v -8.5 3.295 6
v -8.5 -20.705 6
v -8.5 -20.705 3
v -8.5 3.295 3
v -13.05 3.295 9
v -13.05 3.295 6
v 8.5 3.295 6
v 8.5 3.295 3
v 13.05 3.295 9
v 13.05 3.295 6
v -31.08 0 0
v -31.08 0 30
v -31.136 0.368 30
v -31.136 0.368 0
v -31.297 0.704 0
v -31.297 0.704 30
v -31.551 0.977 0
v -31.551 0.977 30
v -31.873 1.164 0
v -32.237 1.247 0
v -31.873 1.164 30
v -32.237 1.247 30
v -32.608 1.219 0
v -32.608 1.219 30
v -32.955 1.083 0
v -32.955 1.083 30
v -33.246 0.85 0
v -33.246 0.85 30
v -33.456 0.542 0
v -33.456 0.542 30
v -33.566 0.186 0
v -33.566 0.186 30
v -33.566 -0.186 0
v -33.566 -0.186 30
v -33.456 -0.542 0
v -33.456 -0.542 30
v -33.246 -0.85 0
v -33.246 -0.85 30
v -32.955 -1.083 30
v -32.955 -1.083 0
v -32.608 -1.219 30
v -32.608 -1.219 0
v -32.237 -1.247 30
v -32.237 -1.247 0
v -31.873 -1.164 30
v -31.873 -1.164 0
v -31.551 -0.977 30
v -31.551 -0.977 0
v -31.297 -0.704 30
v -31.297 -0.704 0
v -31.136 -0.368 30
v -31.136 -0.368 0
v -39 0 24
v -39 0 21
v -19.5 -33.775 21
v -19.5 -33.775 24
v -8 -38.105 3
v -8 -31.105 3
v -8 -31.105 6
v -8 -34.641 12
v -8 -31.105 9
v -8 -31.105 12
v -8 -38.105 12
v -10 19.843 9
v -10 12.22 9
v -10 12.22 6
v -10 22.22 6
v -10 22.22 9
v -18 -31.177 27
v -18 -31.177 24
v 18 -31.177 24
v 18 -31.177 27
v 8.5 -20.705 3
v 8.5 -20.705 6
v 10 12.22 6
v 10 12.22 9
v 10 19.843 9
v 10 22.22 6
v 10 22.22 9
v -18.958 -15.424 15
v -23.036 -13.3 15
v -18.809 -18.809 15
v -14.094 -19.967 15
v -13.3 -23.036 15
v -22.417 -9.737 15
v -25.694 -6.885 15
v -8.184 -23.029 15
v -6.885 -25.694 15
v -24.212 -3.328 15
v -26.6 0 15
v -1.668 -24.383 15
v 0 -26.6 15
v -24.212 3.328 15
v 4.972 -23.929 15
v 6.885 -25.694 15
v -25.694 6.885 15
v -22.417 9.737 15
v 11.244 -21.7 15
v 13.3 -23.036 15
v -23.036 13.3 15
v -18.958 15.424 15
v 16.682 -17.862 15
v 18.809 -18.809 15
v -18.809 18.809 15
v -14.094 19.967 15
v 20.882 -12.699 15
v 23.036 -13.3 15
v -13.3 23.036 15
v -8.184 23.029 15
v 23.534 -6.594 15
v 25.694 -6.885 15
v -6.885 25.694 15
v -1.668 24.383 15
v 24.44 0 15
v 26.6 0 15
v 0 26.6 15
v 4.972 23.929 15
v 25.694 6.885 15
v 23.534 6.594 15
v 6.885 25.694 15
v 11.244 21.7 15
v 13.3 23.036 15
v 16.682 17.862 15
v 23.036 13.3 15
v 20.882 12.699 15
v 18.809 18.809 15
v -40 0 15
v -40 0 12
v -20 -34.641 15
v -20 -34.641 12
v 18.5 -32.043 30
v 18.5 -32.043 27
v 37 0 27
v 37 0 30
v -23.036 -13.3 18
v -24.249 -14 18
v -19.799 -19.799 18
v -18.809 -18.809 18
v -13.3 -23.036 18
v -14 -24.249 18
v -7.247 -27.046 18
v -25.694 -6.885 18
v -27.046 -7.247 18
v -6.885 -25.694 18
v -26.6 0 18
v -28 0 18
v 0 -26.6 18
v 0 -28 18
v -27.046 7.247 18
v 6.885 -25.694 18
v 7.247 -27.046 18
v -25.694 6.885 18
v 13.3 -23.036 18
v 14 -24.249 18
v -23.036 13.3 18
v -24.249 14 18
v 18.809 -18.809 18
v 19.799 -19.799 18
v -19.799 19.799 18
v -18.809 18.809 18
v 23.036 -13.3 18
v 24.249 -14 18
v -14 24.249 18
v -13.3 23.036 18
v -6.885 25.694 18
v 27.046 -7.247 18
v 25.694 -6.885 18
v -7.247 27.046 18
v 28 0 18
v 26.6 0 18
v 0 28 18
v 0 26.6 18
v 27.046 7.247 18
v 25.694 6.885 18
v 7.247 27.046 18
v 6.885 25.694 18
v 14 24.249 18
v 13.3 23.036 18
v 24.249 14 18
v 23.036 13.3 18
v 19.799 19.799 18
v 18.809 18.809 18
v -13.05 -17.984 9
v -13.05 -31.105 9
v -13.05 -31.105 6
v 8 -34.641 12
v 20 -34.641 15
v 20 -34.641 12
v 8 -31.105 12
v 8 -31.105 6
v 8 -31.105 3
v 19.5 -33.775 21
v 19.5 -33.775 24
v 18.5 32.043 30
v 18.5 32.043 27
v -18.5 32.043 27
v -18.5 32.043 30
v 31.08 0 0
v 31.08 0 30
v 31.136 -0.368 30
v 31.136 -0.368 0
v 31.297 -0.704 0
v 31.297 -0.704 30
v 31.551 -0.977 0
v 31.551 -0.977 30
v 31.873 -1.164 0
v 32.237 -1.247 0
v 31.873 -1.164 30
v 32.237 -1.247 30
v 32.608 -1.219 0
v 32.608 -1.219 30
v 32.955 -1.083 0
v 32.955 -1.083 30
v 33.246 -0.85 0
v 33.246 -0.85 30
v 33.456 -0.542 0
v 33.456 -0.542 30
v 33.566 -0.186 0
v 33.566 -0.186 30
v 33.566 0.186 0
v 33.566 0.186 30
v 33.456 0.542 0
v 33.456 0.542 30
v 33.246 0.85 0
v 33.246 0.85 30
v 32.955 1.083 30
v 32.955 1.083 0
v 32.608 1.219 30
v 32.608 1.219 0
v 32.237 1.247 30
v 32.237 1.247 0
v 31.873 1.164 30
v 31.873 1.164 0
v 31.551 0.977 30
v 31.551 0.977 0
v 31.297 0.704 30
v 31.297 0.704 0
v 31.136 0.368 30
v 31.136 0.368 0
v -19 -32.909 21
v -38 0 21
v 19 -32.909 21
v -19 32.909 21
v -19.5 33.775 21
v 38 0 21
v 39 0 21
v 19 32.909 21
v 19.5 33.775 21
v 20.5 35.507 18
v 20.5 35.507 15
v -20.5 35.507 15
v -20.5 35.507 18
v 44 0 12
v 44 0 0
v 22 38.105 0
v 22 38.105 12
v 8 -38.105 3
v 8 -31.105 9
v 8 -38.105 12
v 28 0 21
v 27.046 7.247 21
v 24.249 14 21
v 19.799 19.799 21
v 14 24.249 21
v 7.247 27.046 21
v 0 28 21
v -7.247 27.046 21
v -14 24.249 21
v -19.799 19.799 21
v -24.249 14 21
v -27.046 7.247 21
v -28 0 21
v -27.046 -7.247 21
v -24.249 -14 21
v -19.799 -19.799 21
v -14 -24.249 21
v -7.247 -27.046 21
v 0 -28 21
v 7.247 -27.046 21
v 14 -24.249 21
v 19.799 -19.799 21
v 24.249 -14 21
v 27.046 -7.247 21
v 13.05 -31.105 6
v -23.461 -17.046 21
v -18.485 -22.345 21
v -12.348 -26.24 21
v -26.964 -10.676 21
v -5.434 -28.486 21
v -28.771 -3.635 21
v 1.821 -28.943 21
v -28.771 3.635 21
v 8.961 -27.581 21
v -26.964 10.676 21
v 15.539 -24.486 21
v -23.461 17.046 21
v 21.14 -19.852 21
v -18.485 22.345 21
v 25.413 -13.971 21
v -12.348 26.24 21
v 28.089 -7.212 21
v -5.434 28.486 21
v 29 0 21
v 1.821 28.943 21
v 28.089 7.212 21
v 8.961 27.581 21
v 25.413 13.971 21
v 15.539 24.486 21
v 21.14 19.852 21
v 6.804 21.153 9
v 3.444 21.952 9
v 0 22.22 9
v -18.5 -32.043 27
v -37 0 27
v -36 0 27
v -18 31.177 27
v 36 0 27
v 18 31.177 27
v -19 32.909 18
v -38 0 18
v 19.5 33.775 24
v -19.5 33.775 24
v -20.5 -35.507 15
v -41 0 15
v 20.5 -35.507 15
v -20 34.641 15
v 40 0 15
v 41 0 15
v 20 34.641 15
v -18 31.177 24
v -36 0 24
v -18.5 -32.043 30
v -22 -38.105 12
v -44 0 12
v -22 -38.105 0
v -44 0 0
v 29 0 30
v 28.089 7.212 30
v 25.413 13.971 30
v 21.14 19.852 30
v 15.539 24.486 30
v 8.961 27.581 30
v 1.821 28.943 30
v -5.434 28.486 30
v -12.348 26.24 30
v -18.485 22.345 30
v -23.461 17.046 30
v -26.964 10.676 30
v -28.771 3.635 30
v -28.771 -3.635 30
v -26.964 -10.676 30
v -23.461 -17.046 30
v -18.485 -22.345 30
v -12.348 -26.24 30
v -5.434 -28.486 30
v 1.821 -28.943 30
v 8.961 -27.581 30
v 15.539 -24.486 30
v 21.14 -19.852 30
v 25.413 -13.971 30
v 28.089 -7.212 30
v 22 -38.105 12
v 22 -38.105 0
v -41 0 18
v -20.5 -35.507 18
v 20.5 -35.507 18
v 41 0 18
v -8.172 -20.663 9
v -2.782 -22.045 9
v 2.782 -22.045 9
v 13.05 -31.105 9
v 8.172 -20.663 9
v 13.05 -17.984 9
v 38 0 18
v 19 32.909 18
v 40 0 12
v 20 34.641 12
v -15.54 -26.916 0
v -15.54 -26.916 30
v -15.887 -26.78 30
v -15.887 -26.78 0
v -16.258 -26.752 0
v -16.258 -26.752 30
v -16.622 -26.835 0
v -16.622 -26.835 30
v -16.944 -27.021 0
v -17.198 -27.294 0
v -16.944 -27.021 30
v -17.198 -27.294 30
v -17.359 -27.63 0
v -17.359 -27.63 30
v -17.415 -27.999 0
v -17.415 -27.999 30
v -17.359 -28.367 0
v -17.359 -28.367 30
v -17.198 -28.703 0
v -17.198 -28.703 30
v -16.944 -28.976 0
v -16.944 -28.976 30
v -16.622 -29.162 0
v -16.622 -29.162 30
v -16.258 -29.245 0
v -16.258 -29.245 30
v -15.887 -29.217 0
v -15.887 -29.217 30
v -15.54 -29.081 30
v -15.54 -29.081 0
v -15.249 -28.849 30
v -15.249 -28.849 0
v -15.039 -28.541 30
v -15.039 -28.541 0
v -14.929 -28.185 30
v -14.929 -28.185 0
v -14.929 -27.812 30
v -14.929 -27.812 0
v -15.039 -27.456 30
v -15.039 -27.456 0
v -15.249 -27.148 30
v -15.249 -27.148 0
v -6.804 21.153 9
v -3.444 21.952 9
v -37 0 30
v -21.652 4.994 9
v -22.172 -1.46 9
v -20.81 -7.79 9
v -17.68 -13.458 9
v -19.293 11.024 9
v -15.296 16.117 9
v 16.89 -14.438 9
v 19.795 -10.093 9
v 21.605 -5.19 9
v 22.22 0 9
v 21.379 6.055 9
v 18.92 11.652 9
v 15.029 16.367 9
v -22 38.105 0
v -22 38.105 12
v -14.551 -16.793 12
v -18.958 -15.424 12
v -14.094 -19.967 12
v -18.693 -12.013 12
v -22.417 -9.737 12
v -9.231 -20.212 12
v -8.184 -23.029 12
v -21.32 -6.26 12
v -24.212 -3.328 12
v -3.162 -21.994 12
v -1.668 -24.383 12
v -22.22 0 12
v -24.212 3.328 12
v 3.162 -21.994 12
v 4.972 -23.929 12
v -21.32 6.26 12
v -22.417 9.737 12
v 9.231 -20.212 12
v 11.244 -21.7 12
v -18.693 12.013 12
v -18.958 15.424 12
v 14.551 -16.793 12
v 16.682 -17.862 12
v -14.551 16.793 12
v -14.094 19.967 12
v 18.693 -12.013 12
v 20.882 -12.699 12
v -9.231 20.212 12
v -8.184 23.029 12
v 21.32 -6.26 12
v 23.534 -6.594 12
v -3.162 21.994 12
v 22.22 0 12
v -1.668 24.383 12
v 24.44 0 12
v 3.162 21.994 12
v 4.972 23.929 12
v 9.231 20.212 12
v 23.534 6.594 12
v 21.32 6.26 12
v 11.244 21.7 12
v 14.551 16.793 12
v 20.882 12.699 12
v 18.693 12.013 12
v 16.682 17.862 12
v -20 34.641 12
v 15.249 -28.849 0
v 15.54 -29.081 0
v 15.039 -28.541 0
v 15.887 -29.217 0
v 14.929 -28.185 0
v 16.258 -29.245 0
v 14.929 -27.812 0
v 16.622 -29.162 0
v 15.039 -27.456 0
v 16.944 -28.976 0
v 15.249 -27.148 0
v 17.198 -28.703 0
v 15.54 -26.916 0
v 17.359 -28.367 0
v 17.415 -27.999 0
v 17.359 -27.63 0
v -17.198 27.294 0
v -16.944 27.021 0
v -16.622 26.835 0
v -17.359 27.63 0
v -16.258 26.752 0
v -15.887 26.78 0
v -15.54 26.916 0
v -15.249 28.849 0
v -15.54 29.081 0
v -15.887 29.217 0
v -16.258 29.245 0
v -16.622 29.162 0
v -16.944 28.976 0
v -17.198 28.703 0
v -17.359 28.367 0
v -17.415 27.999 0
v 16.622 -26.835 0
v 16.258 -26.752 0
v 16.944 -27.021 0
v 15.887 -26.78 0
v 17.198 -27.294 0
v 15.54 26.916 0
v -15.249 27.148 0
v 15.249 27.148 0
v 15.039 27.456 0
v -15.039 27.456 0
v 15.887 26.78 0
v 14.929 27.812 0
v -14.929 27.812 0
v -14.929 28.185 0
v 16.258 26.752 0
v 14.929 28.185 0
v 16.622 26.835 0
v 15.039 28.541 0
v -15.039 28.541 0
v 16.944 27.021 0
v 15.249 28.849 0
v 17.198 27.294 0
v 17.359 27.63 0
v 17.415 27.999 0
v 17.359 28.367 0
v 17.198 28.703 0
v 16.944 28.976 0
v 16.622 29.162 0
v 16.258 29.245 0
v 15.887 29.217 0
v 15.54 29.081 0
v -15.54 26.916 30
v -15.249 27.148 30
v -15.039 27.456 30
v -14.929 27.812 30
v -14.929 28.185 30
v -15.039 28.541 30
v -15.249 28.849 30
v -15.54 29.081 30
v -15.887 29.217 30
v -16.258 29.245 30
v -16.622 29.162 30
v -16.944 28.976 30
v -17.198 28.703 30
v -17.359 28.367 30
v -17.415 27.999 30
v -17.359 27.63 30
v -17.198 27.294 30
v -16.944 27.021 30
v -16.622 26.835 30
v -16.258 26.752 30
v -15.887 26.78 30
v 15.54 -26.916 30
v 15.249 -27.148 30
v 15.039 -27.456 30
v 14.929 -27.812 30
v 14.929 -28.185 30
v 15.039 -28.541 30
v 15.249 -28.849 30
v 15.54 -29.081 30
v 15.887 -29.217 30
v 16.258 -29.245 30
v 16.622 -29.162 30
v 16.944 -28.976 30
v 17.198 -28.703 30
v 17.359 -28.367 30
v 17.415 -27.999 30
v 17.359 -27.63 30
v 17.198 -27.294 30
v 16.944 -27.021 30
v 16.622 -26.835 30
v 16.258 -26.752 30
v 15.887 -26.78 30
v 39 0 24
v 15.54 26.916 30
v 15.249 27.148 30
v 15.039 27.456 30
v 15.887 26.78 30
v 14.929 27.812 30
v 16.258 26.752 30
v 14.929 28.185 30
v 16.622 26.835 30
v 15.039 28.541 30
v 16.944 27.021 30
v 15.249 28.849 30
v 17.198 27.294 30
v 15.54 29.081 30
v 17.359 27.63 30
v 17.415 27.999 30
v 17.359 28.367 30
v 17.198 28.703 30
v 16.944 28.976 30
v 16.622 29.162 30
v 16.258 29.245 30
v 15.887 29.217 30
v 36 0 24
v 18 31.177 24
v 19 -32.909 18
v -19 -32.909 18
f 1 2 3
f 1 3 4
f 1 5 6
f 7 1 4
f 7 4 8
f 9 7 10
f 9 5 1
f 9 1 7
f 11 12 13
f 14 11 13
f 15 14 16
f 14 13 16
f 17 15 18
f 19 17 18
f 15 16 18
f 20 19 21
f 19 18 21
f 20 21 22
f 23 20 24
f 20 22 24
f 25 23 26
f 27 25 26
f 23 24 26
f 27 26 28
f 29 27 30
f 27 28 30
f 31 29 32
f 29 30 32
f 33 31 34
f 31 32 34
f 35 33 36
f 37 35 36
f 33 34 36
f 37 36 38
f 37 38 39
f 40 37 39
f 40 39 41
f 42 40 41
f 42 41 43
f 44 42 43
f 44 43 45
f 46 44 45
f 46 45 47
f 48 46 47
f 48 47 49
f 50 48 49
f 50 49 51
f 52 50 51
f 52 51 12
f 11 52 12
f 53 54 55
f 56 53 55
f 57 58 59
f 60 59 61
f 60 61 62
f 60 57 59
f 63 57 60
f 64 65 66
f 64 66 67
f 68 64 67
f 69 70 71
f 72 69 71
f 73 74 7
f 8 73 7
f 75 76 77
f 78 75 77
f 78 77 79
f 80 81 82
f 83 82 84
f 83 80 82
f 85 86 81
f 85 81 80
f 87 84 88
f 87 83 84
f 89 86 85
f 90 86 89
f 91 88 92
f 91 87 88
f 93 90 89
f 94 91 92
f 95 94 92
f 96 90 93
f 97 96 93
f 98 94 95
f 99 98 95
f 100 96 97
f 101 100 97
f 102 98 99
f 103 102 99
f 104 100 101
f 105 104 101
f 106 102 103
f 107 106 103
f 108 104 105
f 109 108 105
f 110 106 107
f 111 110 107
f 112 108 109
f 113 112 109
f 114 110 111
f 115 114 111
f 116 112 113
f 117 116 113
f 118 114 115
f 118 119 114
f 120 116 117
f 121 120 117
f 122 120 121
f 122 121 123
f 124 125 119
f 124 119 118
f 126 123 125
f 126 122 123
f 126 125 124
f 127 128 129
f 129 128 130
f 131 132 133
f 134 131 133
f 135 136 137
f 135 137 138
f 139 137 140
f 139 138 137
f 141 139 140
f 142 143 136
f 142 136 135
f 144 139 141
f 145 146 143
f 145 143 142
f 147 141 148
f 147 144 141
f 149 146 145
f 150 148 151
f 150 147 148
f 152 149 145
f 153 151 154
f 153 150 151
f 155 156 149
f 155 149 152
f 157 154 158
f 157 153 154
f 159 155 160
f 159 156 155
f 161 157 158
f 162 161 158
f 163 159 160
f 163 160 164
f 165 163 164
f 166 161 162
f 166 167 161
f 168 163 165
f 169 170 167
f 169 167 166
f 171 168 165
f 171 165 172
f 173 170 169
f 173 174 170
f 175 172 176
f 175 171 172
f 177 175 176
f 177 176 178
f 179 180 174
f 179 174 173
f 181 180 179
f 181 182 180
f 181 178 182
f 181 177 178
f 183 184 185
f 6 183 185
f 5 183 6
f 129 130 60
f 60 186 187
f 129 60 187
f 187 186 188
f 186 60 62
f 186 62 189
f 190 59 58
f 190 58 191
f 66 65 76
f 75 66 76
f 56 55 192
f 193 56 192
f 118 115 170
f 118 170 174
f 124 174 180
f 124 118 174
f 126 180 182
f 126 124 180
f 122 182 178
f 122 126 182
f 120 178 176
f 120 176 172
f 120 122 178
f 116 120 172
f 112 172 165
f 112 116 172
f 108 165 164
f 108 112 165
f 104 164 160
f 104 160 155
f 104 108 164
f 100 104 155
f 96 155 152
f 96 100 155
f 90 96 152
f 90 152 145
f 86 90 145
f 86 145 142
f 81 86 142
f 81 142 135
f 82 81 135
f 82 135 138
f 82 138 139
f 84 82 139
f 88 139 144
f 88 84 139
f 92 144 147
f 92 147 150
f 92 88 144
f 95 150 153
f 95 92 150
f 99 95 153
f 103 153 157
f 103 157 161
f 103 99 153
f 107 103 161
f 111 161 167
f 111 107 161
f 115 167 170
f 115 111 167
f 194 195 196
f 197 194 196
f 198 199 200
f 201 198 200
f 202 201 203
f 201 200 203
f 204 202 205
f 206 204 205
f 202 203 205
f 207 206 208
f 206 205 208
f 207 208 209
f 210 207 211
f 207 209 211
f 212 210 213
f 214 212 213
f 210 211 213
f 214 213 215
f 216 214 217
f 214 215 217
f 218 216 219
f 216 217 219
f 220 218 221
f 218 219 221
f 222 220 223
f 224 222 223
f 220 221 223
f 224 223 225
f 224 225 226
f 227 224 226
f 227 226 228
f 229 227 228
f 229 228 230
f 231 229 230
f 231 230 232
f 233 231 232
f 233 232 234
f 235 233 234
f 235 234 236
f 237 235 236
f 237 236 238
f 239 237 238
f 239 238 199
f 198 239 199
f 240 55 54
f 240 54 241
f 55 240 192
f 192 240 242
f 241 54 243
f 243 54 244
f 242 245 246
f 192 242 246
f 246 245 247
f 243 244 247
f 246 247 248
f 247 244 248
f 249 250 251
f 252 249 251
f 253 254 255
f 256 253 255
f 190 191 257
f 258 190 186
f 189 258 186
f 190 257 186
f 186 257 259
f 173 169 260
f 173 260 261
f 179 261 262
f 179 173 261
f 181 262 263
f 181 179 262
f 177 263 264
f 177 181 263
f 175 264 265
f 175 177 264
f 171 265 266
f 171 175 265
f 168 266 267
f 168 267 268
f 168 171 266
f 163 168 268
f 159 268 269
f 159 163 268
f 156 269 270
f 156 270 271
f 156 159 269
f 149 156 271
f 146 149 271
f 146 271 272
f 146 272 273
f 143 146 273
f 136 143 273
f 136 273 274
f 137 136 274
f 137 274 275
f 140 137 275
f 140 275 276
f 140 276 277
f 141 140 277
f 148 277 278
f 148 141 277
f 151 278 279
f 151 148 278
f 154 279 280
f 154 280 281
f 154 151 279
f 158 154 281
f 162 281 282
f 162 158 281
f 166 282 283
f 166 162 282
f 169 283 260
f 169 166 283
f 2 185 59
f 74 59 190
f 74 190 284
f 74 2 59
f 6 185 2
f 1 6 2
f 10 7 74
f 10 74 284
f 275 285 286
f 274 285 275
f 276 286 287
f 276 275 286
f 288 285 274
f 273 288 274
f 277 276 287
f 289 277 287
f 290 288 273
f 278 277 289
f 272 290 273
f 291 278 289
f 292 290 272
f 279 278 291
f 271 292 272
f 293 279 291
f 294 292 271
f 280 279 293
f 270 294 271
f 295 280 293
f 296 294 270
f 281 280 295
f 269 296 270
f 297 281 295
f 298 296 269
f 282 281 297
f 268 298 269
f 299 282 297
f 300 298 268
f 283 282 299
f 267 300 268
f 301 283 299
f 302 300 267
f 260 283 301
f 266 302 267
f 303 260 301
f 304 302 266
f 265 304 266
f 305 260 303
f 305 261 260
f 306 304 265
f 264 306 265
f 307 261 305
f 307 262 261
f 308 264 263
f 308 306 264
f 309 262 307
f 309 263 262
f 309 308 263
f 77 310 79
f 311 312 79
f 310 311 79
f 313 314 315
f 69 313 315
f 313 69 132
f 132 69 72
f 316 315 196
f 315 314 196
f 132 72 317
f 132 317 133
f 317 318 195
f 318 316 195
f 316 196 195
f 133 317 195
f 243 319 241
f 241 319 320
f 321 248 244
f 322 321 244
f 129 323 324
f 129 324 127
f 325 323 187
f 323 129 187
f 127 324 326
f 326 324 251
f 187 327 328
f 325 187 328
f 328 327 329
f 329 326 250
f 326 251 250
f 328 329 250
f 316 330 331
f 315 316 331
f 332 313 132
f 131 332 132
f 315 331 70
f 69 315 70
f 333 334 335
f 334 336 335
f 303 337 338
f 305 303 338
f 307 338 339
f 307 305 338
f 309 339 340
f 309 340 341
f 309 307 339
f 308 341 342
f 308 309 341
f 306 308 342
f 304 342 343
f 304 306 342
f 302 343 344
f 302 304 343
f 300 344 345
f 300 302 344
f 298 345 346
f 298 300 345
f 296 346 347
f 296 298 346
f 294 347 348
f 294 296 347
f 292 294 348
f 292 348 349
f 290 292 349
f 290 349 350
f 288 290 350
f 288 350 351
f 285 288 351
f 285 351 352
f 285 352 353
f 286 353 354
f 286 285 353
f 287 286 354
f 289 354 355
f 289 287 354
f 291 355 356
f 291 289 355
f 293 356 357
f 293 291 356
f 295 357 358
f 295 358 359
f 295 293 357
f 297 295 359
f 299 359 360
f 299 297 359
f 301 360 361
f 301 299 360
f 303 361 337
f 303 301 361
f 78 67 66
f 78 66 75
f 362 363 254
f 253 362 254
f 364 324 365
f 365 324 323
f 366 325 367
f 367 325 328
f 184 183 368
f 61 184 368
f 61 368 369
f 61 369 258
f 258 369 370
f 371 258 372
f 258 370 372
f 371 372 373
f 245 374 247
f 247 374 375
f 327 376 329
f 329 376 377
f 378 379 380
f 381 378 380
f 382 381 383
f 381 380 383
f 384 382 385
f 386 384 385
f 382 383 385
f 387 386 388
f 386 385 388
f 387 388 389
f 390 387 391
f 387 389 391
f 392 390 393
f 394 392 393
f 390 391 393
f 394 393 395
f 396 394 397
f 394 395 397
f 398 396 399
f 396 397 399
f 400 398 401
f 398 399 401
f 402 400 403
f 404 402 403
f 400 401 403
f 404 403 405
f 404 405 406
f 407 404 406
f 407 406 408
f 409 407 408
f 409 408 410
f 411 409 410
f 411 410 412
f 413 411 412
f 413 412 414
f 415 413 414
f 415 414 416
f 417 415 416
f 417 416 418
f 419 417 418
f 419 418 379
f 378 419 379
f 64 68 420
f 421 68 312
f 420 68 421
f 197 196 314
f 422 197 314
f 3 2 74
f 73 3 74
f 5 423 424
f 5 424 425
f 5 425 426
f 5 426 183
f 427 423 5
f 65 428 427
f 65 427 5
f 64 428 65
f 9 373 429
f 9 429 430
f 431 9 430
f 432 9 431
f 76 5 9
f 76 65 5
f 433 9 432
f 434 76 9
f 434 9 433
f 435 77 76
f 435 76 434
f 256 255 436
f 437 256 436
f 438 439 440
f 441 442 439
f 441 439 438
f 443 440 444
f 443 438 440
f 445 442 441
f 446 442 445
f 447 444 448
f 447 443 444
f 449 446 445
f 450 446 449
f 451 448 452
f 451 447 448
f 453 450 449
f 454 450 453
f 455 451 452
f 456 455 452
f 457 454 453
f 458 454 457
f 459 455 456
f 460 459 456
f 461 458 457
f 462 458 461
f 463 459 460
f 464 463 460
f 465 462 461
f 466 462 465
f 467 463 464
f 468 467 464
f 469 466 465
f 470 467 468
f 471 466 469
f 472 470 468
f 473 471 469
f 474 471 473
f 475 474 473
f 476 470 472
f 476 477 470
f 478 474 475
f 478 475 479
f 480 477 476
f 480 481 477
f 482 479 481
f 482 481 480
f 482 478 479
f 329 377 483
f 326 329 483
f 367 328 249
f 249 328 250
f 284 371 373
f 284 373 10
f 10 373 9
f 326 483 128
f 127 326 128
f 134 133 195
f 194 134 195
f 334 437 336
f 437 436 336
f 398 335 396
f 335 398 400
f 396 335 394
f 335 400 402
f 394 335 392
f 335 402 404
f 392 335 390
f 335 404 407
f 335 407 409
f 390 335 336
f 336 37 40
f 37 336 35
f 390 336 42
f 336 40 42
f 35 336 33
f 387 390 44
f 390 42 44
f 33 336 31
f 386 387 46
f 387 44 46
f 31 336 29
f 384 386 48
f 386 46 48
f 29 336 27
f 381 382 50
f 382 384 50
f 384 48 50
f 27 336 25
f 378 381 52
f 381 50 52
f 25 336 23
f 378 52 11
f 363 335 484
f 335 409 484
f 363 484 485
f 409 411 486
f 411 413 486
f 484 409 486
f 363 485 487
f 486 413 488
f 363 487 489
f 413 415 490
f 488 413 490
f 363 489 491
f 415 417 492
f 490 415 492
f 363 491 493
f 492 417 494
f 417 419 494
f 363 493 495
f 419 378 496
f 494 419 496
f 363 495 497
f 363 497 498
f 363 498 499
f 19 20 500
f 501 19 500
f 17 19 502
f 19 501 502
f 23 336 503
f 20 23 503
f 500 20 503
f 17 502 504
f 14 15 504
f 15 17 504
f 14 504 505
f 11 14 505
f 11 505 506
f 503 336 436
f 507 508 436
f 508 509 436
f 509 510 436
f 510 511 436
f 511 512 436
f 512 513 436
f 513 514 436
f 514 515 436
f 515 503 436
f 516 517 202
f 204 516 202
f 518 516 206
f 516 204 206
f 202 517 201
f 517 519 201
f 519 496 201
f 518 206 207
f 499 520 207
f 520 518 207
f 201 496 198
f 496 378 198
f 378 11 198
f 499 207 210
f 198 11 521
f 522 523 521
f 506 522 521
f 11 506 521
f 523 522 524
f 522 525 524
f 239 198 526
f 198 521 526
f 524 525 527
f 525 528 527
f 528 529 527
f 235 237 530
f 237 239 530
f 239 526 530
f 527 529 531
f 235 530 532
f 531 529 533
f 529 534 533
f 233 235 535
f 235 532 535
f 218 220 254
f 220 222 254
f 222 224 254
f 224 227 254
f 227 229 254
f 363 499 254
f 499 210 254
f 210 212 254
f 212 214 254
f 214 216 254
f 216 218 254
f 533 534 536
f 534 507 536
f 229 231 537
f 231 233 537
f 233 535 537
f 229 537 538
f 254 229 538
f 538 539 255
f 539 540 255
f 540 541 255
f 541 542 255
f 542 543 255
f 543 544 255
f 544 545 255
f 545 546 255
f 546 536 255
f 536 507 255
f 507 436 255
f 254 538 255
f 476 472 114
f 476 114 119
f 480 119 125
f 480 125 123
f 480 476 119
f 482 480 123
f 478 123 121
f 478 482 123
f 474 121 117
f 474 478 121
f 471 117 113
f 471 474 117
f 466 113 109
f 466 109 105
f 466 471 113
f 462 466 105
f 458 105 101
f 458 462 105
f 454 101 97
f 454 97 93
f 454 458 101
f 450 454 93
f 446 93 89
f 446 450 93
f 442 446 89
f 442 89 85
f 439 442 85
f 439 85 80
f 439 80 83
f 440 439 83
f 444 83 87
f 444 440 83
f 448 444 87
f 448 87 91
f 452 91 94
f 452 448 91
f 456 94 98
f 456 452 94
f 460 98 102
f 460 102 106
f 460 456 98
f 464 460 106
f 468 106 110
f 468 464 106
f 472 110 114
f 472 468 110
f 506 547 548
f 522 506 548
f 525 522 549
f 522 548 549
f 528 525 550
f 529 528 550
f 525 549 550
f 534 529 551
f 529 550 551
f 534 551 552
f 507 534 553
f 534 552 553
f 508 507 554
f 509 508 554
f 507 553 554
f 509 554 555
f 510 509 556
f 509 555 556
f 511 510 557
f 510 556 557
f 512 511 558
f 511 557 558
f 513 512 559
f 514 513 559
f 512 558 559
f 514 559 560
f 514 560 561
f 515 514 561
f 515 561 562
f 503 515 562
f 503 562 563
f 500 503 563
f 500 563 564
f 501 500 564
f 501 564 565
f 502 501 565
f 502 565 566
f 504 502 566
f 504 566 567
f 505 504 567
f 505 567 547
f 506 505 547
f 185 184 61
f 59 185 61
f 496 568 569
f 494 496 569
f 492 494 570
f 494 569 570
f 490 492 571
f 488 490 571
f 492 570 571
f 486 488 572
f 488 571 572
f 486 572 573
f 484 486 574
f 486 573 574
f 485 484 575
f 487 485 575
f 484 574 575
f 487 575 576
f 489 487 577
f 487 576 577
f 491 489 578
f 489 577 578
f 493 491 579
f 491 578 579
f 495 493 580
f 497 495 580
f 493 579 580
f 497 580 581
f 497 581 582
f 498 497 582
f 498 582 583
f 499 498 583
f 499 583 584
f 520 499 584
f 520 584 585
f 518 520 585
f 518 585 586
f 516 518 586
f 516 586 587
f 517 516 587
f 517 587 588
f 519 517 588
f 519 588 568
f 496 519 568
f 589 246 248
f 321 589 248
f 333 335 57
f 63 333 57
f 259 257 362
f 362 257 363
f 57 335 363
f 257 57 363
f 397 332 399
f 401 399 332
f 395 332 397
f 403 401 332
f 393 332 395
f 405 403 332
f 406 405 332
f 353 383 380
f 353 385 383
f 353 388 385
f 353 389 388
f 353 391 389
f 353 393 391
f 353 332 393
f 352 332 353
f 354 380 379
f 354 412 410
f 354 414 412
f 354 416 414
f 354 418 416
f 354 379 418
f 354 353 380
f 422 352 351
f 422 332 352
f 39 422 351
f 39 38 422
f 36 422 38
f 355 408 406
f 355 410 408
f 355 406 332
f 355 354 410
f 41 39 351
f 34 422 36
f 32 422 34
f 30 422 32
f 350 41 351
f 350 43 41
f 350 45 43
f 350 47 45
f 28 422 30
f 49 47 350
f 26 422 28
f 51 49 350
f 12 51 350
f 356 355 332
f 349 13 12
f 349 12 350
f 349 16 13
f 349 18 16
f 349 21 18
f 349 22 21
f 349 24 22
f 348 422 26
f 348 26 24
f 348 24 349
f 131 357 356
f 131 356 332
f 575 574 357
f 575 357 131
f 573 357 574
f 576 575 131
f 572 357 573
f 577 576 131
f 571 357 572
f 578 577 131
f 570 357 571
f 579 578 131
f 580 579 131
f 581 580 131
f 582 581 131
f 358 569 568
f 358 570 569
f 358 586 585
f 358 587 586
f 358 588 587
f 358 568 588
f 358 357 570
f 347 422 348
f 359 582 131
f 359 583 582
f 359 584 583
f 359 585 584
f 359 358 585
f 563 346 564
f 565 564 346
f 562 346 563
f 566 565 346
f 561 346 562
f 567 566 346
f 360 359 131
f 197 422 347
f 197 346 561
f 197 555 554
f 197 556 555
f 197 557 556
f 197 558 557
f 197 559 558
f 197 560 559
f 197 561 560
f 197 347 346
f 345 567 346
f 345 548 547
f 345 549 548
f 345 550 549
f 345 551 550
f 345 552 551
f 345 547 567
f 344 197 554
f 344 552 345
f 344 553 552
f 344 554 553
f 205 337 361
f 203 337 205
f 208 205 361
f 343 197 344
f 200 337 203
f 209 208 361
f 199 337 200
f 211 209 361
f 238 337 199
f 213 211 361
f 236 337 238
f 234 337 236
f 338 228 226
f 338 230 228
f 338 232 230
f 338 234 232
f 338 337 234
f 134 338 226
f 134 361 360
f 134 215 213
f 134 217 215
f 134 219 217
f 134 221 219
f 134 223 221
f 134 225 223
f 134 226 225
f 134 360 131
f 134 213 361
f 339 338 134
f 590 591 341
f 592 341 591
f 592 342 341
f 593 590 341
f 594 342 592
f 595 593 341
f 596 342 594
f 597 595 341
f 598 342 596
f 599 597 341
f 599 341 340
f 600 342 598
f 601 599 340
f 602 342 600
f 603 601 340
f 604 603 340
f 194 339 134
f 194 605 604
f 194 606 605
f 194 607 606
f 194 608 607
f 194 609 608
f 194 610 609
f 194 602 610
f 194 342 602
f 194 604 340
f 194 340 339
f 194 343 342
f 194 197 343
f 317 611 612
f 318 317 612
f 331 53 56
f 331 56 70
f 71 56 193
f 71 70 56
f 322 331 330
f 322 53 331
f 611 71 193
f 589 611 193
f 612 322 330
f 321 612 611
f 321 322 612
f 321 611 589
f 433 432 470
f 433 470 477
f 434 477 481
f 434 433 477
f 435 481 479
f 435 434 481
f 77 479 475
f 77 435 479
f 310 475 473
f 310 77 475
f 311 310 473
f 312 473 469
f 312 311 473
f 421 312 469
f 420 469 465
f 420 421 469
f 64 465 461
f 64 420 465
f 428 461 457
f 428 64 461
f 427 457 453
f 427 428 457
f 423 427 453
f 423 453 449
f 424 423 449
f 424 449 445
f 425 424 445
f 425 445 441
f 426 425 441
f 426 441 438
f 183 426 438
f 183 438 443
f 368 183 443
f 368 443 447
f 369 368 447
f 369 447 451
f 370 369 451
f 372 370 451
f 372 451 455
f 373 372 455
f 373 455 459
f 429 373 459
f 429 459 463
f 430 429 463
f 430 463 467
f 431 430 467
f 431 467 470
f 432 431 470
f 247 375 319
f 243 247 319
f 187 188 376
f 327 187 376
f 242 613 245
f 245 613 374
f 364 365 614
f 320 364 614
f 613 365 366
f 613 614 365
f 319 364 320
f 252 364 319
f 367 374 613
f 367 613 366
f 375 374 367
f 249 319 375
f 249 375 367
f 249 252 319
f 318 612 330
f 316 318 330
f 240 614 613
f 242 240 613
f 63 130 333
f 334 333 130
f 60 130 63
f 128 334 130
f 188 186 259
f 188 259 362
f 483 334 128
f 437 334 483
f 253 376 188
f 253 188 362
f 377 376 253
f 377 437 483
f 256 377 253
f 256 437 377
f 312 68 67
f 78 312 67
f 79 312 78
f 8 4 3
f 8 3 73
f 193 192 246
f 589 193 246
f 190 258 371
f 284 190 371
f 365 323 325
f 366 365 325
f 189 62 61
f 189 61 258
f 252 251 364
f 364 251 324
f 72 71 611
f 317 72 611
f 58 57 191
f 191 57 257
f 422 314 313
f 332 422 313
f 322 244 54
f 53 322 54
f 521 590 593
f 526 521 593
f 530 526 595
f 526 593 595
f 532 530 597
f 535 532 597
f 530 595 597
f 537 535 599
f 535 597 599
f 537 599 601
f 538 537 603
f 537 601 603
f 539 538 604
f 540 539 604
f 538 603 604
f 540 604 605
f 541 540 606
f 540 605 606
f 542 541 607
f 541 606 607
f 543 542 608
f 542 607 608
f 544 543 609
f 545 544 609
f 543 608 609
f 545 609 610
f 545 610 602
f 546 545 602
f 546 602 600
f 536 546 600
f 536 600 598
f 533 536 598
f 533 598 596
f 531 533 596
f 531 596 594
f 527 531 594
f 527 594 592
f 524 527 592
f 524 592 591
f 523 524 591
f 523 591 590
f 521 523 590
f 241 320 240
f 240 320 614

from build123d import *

# Parameters (mm, degrees)
PAD_DEPTH          = 9
SKETCH001_W        = 26.1
SKETCH001_H        = 34.4
POCKET_DEPTH       = 3
SKETCH002_R        = 22.22
PAD001_DEPTH       = 3
SKETCH003_R        = 24.44
PAD002_DEPTH       = 3
SKETCH004_R        = 26.6
PAD003_DEPTH       = 3
SKETCH005_R        = 28
PAD004_DEPTH       = 3
SKETCH006_R        = 29
PAD005_DEPTH       = 3
SKETCH007_R        = 29
PAD006_DEPTH       = 3
SKETCH008_R        = 29
PAD007_DEPTH       = 3
SKETCH009_W        = 17
SKETCH009_H        = 24
POCKET001_DEPTH    = 3
SKETCH010_W        = 16
SKETCH010_H        = 9
POCKET002_DEPTH    = 7
SKETCH011_W        = 20
SKETCH011_H        = 10
POCKET003_DEPTH    = 3
SKETCH012_R        = 1.25
POCKET004_DEPTH    = 270.433943
POLARPATTERN_COUNT = 6


with BuildPart() as part:
    # Sketch → Pad (new body)
    with BuildSketch(Plane.XY):
        Polygon((44, 0), (22, 38.105118), (-22, 38.105118), (-44, 0), (-22, -38.105118), (22, -38.105118), align=None)
    extrude(amount=PAD_DEPTH)

    # Sketch001 (on Face8 of Pad) → Pocket (cut)
    with BuildSketch(Plane.XY.offset(9)):
        with Locations((0, -13.905118)):
            Rectangle(SKETCH001_W, SKETCH001_H)
    extrude(amount=-POCKET_DEPTH, mode=Mode.SUBTRACT)

    # Sketch002 (on Face5 of Pocket) → Pad001 (join)
    with BuildSketch(Plane.XY.offset(9)):
        Polygon((22, 38.105118), (-22, 38.105118), (-44, 0), (-22, -38.105118), (22, -38.105118), (44, 0), align=None)
        Circle(SKETCH002_R, mode=Mode.SUBTRACT)
    extrude(amount=PAD001_DEPTH)

    # Sketch003 (on Face14 of Pad001) → Pad002 (join)
    with BuildSketch(Plane.XY.offset(12)):
        Polygon((40, 0), (20, 34.641016), (-20, 34.641016), (-40, 0), (-20, -34.641016), (20, -34.641016), align=None)
        Circle(SKETCH003_R, mode=Mode.SUBTRACT)
    extrude(amount=PAD002_DEPTH)

    # Sketch004 (on Face21 of Pad002) → Pad003 (join)
    with BuildSketch(Plane.XY.offset(15)):
        Polygon((41, 0), (20.5, 35.507042), (-20.5, 35.507042), (-41, 0), (-20.5, -35.507042), (20.5, -35.507042), align=None)
        Circle(SKETCH004_R, mode=Mode.SUBTRACT)
    extrude(amount=PAD003_DEPTH)

    # Sketch005 (on Face28 of Pad003) → Pad004 (join)
    with BuildSketch(Plane.XY.offset(18)):
        Polygon((19, 32.908965), (-19, 32.908965), (-38, 0), (-19, -32.908965), (19, -32.908965), (38, 0), align=None)
        Circle(SKETCH005_R, mode=Mode.SUBTRACT)
    extrude(amount=PAD004_DEPTH)

    # Sketch006 (on Face35 of Pad004) → Pad005 (join)
    with BuildSketch(Plane.XY.offset(21)):
        Polygon((39, 0), (19.5, 33.774991), (-19.5, 33.774991), (-39, 0), (-19.5, -33.774991), (19.5, -33.774991), align=None)
        Circle(SKETCH006_R, mode=Mode.SUBTRACT)
    extrude(amount=PAD005_DEPTH)

    # Sketch007 (on Face42 of Pad005) → Pad006 (join)
    with BuildSketch(Plane.XY.offset(24)):
        Polygon((36, 0), (18, 31.176915), (-18, 31.176915), (-36, 0), (-18, -31.176915), (18, -31.176915), align=None)
        Circle(SKETCH007_R, mode=Mode.SUBTRACT)
    extrude(amount=PAD006_DEPTH)

    # Sketch008 (on Face49 of Pad006) → Pad007 (join)
    with BuildSketch(Plane.XY.offset(27)):
        Polygon((37, 0), (18.5, 32.04294), (-18.5, 32.04294), (-37, 0), (-18.5, -32.04294), (18.5, -32.04294), align=None)
        Circle(SKETCH008_R, mode=Mode.SUBTRACT)
    extrude(amount=PAD007_DEPTH)

    # Sketch009 (on Face74 of Pad007) → Pocket001 (cut)
    with BuildSketch(Plane.XY.offset(6)):
        with Locations((0, -8.705118)):
            Rectangle(SKETCH009_W, SKETCH009_H)
    extrude(amount=-POCKET001_DEPTH, mode=Mode.SUBTRACT)

    # Sketch010 (on Face12 of Pocket001) → Pocket002 (cut)
    with BuildSketch(Plane.XZ.offset(38.105118)):
        with Locations((0, 7.5)):
            Rectangle(SKETCH010_W, SKETCH010_H)
    extrude(amount=-POCKET002_DEPTH, mode=Mode.SUBTRACT)

    # Sketch011 (on Face40 of Pocket002) → Pocket003 (cut)
    with BuildSketch(Plane.XY.offset(9)):
        with Locations((0, 17.22)):
            Rectangle(SKETCH011_W, SKETCH011_H)
    extrude(amount=-POCKET003_DEPTH, mode=Mode.SUBTRACT)

    # Sketch012 (on Face93 of Pocket003) → Pocket004 (cut, through all)
    with BuildSketch(Plane.XY.offset(30)):
        with Locations((-32.33, 0)):
            Circle(SKETCH012_R)
    pocket004 = extrude(amount=-POCKET004_DEPTH, mode=Mode.SUBTRACT)

    # PolarPattern: Pocket004 ×6 about axis
    polarpattern_axis = Axis((0, 0, 30), (0, 0, 1))
    for i in range(1, POLARPATTERN_COUNT):
        add(pocket004.rotate(polarpattern_axis, i * 360 / POLARPATTERN_COUNT), mode=Mode.SUBTRACT)


solid = part.part
